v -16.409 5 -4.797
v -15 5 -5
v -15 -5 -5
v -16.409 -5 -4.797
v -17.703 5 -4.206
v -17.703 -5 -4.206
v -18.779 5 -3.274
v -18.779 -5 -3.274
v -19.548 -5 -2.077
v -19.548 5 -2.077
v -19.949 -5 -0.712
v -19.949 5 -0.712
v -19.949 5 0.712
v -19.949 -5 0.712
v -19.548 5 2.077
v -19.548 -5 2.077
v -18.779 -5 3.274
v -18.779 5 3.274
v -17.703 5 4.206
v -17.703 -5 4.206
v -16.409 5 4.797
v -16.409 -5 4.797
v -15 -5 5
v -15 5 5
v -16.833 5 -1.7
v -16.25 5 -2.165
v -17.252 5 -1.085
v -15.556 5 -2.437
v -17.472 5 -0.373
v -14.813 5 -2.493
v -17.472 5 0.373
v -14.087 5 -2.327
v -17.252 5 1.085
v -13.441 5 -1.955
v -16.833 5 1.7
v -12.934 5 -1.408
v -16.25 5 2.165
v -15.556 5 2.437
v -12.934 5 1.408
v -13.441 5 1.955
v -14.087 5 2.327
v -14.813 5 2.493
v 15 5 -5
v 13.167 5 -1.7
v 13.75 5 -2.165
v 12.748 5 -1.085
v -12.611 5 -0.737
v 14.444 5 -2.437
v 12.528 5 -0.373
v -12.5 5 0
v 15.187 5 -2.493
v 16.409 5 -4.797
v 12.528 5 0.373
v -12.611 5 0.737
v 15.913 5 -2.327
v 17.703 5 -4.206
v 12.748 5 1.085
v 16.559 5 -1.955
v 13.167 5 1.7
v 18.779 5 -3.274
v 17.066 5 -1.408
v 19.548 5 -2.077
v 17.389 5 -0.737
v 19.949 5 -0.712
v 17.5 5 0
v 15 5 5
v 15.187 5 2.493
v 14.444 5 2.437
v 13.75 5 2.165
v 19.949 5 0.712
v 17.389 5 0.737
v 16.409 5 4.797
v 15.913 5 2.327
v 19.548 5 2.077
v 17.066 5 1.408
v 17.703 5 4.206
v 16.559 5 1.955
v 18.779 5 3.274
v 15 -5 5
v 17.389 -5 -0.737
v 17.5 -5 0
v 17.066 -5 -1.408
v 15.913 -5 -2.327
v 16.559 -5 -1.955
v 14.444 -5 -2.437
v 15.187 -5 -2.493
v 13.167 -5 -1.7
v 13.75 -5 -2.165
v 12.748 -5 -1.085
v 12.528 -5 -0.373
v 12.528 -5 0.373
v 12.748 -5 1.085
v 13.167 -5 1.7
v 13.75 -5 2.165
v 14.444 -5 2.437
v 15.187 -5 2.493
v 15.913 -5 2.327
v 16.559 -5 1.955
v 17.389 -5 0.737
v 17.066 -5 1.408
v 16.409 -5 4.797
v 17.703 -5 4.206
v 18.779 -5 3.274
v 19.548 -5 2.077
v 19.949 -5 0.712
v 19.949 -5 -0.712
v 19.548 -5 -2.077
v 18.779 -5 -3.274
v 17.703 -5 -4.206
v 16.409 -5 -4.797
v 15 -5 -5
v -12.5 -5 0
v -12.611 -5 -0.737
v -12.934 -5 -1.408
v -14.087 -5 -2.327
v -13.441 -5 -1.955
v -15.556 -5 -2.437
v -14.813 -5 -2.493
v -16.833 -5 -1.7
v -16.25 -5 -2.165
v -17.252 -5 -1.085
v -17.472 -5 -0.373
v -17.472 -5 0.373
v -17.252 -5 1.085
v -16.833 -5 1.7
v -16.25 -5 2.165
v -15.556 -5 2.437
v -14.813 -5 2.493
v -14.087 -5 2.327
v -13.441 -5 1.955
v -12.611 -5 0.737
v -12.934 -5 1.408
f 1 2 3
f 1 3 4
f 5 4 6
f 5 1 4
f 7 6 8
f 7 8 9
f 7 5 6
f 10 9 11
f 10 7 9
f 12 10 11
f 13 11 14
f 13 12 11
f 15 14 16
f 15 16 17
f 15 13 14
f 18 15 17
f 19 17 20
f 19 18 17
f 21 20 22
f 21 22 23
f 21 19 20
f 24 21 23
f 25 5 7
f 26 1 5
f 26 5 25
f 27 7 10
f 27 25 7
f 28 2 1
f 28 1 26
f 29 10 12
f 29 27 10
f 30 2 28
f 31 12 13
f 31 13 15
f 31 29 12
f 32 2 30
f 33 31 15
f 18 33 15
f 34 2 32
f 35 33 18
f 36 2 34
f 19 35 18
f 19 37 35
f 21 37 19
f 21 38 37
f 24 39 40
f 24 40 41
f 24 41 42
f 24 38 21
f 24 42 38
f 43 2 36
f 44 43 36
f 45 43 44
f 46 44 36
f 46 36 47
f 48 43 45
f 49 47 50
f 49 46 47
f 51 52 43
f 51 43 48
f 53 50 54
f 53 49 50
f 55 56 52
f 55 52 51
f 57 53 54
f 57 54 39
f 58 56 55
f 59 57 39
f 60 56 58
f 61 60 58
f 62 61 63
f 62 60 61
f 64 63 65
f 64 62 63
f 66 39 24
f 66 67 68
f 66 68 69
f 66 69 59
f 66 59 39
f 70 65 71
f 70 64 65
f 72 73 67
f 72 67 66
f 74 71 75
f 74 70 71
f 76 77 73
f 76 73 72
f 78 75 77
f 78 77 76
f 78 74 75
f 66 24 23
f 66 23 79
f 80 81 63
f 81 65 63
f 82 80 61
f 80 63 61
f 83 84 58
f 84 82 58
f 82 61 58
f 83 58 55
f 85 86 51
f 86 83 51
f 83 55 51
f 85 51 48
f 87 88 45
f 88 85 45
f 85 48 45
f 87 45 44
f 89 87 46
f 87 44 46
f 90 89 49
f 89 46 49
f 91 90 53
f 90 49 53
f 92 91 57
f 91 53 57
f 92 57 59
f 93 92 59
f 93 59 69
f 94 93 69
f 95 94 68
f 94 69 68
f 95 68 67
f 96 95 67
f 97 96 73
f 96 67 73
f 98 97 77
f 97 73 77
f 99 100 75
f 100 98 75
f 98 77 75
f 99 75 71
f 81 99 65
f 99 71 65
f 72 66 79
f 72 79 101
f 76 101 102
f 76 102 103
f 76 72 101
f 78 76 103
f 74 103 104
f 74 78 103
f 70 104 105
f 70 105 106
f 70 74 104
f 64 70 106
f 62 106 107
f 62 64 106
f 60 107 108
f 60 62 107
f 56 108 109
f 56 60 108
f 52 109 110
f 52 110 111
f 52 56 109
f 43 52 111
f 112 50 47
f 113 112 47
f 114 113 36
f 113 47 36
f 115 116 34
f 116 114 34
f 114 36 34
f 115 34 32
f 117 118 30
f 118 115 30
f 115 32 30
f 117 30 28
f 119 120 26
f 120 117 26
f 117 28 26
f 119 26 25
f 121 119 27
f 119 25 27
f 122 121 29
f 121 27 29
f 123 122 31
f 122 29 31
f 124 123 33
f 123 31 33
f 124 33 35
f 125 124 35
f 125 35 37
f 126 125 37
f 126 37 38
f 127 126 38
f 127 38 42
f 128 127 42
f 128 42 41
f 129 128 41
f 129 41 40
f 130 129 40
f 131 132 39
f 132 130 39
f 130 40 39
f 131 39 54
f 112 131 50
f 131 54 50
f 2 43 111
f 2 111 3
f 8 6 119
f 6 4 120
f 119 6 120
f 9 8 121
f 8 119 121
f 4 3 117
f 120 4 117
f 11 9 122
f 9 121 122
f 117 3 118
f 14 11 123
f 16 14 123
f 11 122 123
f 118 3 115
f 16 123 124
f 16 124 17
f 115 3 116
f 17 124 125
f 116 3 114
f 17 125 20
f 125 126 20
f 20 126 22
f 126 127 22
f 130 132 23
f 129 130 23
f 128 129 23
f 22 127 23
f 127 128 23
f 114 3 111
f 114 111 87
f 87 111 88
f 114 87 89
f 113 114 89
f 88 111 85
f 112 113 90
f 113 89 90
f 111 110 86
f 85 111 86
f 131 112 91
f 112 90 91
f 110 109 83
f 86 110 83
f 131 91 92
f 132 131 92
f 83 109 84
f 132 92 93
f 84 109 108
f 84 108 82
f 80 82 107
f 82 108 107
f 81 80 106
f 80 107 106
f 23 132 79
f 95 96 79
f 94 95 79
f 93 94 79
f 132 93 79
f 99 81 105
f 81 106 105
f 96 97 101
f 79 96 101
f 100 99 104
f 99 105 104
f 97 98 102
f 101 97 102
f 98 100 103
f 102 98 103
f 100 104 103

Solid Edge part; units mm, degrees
sketch "Sketch1" plane through (0, 0, 0) normal (0, -1, 0) x (1, 0, 0)
  arc A0 (-15, -5) -> (-15, 5) centre (-15, 0) cw
  line L0 (-15, 5) -> (15, 5)
  arc A1 (15, 5) -> (15, -5) centre (15, 0) cw
  line L1 (15, -5) -> (-15, -5)
  circle A2 centre (15, 0) radius 2.5
  circle A3 centre (-15, 0) radius 2.5
extrude "Protrusion1" add sketch "Sketch1" along normal mid plane 10
